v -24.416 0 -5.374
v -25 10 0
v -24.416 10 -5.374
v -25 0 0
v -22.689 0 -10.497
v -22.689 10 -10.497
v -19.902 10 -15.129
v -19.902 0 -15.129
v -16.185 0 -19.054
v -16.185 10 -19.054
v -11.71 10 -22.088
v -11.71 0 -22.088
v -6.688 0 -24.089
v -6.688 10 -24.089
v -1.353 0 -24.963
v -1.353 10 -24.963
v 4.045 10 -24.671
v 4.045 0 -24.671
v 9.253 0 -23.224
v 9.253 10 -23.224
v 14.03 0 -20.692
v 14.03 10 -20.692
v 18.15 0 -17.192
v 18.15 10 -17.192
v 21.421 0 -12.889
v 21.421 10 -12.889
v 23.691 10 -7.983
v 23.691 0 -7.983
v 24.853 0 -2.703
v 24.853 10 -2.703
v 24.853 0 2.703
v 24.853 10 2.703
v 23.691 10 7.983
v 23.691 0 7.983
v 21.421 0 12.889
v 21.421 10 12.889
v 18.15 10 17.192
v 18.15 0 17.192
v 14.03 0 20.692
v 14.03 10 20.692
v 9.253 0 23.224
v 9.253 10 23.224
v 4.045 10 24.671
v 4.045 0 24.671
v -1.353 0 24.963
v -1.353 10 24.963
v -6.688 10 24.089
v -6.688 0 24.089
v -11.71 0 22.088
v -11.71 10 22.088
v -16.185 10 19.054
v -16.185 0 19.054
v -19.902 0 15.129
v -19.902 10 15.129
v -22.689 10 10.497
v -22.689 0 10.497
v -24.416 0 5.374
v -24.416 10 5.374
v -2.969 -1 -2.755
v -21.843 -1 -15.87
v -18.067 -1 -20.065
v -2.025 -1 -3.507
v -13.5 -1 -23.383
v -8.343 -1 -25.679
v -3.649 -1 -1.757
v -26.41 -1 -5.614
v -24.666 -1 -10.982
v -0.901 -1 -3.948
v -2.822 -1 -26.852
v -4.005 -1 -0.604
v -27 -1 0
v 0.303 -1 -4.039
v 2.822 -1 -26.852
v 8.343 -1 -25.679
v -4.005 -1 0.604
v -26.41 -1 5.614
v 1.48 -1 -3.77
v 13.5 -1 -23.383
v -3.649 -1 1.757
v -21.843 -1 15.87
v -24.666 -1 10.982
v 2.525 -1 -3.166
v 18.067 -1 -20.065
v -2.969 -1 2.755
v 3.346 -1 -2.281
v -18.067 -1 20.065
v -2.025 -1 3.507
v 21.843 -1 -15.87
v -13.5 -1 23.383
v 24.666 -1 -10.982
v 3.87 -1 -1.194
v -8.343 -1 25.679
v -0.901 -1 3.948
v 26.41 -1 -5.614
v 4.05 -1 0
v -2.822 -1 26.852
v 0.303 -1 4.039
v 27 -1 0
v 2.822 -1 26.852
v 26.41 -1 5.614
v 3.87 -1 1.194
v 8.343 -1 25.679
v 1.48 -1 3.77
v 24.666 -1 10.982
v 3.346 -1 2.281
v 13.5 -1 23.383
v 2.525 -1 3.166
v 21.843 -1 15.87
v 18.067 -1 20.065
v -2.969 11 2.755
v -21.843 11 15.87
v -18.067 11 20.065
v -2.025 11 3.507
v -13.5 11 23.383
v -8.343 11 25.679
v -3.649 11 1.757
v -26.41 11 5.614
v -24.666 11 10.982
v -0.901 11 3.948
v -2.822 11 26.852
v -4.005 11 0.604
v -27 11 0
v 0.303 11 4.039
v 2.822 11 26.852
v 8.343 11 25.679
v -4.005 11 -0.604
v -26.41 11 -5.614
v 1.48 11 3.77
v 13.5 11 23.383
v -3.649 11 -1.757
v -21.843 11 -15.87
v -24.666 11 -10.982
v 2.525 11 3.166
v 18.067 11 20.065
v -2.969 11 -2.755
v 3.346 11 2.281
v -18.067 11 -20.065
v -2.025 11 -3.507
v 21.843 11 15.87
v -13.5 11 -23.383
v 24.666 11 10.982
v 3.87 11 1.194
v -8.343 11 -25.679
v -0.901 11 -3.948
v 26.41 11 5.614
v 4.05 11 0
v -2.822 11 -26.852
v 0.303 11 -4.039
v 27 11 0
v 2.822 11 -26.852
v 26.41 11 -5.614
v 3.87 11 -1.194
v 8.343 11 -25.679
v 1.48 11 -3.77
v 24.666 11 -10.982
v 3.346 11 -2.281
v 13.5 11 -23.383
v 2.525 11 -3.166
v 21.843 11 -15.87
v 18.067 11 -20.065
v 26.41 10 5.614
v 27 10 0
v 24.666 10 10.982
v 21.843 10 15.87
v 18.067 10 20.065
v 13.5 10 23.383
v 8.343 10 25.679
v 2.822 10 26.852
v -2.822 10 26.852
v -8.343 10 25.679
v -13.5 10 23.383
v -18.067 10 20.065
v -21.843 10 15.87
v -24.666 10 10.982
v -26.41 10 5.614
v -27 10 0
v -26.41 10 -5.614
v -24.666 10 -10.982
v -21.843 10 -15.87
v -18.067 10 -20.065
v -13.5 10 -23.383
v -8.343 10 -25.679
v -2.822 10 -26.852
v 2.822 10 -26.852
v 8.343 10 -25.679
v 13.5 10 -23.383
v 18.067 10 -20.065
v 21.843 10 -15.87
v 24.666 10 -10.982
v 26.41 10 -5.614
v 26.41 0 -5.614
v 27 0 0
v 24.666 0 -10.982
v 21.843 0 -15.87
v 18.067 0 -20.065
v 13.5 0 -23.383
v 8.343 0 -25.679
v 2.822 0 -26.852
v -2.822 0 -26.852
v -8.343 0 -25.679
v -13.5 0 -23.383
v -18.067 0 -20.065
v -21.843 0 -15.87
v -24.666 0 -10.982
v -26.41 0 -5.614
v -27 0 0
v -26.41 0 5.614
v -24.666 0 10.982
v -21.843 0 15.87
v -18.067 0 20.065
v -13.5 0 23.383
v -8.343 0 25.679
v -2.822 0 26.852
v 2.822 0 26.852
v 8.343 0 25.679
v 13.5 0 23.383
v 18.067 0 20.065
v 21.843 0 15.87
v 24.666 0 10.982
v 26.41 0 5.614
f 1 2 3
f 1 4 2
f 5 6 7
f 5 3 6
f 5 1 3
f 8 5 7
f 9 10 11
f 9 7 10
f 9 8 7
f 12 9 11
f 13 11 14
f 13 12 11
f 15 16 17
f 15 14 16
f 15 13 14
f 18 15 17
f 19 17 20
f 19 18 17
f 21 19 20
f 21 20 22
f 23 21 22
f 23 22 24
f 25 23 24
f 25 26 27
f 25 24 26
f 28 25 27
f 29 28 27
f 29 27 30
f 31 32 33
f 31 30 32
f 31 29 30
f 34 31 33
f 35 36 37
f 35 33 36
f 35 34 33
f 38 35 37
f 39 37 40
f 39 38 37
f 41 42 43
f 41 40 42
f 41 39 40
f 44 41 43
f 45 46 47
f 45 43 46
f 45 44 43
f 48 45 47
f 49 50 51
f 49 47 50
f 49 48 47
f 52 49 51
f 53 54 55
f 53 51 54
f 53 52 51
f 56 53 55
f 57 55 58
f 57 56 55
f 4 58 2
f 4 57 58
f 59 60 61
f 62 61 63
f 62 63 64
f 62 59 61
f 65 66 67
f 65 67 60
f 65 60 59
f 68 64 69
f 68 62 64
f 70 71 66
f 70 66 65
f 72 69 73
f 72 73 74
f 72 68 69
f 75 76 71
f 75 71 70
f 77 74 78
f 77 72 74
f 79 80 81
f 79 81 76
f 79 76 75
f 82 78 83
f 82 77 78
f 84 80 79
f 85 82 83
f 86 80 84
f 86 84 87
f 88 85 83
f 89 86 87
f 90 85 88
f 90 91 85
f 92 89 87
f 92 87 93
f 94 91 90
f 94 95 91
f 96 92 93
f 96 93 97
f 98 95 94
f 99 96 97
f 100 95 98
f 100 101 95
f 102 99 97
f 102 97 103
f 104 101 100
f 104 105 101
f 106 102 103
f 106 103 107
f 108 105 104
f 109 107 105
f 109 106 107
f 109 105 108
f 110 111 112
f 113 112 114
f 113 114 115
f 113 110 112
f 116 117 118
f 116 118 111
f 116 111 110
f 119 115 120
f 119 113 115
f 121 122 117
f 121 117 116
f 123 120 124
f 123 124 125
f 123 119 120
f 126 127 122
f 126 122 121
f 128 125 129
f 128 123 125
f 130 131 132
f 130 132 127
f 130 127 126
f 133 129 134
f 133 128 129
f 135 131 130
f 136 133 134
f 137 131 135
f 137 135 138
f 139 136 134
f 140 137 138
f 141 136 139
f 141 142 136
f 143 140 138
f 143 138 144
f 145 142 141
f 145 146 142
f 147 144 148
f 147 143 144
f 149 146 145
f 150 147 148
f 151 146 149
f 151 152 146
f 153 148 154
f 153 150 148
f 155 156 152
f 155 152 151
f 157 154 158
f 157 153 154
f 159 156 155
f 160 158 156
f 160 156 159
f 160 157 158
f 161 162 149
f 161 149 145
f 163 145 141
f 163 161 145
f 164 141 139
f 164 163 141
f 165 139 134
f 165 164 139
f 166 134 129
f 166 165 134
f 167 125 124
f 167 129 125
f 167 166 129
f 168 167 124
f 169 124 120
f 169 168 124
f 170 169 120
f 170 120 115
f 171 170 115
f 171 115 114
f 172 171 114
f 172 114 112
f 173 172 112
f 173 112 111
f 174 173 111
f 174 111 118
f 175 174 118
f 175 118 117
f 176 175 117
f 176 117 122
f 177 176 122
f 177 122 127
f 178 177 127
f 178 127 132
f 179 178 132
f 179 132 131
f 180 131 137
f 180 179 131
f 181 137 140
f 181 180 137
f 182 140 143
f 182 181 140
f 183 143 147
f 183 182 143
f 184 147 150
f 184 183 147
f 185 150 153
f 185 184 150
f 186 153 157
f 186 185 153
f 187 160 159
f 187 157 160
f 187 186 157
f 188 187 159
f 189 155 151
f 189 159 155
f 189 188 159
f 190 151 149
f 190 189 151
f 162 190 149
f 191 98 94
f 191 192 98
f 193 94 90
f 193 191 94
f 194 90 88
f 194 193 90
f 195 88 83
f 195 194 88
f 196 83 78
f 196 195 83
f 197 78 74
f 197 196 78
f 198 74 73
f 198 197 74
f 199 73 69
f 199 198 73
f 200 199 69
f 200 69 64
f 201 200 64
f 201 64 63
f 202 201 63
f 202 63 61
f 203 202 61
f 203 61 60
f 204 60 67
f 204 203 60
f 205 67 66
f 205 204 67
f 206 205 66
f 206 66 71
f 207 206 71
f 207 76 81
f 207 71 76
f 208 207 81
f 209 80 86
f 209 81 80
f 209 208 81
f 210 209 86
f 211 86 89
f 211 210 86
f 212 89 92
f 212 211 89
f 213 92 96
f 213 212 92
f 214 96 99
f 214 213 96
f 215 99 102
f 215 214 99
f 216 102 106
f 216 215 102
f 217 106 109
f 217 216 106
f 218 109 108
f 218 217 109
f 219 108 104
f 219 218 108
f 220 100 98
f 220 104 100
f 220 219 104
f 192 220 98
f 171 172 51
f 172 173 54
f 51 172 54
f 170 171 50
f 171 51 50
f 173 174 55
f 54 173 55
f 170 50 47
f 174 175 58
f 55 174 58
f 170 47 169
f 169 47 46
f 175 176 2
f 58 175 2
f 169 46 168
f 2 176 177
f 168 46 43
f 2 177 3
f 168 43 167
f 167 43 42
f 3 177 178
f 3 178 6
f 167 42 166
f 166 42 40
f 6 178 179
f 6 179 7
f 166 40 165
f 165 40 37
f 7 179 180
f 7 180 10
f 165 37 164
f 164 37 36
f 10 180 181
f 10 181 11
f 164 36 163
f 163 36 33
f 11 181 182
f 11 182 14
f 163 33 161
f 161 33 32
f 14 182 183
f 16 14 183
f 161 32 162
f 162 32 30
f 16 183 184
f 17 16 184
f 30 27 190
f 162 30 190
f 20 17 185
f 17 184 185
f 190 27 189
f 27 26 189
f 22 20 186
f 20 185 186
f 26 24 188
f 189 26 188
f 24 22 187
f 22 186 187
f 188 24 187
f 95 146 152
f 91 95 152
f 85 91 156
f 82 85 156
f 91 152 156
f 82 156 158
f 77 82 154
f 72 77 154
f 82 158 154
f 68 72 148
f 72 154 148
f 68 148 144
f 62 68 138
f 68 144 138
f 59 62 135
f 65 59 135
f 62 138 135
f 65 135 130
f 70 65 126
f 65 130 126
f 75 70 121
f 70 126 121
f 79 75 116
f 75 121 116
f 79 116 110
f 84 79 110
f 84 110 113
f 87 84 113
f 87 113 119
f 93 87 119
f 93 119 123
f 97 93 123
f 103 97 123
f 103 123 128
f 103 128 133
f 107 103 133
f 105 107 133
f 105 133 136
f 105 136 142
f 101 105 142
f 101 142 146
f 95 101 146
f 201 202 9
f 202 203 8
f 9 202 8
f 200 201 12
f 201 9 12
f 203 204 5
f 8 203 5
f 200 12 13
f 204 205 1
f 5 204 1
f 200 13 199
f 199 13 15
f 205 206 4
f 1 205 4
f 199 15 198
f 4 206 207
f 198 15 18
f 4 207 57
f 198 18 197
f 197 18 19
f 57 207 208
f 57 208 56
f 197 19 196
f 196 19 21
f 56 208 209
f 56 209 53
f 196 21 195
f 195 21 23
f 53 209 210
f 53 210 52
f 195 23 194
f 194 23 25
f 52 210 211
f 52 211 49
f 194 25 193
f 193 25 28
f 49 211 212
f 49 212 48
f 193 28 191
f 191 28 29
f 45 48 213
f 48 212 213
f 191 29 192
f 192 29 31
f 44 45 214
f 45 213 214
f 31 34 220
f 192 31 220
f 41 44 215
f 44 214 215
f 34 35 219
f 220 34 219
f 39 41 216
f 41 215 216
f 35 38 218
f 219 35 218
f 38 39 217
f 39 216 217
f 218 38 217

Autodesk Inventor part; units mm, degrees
ref_plane "YZ Plane" through (0, 0, 0) normal (1, 0, 0) x (0, 1, 0)
ref_plane "XZ Plane" through (0, 0, 0) normal (0, 1, 0) x (-1, 0, 0)
ref_plane "XY Plane" through (0, 0, 0) normal (0, 0, 1) x (1, 0, 0)
sketch "スケッチ1" plane through (0, 0, 0) normal (0, 1, 0) x (-1, 0, 0)
  circle A0 centre (0, 0) radius 25
  dimension "d0" = 50
extrude "押し出し1" add sketch "スケッチ1" along normal blind 10
sketch "スケッチ2" plane through (0, 10, 0) normal (0, 1, 0) x (1, 0, 0)
  circle A0 centre (0, 0) radius 27
  dimension "d3" = 54
extrude "押し出し2" add sketch "スケッチ2" along normal blind 1
sketch "スケッチ3" plane through (0, 0, 0) normal (0, -1, 0) x (1, 0, 0)
  circle A0 centre (0, 0) radius 27
  dimension "d6" = 54
extrude "押し出し3" add sketch "スケッチ3" along normal blind 1
sketch "スケッチ4" plane through (0, 11, 0) normal (0, 1, 0) x (1, 0, 0)
  circle A0 centre (0, 0) radius 4.05
  dimension "d9" = 8.1
extrude "押し出し4" cut sketch "スケッチ4" against normal blind 12
properties part number "NHK"
